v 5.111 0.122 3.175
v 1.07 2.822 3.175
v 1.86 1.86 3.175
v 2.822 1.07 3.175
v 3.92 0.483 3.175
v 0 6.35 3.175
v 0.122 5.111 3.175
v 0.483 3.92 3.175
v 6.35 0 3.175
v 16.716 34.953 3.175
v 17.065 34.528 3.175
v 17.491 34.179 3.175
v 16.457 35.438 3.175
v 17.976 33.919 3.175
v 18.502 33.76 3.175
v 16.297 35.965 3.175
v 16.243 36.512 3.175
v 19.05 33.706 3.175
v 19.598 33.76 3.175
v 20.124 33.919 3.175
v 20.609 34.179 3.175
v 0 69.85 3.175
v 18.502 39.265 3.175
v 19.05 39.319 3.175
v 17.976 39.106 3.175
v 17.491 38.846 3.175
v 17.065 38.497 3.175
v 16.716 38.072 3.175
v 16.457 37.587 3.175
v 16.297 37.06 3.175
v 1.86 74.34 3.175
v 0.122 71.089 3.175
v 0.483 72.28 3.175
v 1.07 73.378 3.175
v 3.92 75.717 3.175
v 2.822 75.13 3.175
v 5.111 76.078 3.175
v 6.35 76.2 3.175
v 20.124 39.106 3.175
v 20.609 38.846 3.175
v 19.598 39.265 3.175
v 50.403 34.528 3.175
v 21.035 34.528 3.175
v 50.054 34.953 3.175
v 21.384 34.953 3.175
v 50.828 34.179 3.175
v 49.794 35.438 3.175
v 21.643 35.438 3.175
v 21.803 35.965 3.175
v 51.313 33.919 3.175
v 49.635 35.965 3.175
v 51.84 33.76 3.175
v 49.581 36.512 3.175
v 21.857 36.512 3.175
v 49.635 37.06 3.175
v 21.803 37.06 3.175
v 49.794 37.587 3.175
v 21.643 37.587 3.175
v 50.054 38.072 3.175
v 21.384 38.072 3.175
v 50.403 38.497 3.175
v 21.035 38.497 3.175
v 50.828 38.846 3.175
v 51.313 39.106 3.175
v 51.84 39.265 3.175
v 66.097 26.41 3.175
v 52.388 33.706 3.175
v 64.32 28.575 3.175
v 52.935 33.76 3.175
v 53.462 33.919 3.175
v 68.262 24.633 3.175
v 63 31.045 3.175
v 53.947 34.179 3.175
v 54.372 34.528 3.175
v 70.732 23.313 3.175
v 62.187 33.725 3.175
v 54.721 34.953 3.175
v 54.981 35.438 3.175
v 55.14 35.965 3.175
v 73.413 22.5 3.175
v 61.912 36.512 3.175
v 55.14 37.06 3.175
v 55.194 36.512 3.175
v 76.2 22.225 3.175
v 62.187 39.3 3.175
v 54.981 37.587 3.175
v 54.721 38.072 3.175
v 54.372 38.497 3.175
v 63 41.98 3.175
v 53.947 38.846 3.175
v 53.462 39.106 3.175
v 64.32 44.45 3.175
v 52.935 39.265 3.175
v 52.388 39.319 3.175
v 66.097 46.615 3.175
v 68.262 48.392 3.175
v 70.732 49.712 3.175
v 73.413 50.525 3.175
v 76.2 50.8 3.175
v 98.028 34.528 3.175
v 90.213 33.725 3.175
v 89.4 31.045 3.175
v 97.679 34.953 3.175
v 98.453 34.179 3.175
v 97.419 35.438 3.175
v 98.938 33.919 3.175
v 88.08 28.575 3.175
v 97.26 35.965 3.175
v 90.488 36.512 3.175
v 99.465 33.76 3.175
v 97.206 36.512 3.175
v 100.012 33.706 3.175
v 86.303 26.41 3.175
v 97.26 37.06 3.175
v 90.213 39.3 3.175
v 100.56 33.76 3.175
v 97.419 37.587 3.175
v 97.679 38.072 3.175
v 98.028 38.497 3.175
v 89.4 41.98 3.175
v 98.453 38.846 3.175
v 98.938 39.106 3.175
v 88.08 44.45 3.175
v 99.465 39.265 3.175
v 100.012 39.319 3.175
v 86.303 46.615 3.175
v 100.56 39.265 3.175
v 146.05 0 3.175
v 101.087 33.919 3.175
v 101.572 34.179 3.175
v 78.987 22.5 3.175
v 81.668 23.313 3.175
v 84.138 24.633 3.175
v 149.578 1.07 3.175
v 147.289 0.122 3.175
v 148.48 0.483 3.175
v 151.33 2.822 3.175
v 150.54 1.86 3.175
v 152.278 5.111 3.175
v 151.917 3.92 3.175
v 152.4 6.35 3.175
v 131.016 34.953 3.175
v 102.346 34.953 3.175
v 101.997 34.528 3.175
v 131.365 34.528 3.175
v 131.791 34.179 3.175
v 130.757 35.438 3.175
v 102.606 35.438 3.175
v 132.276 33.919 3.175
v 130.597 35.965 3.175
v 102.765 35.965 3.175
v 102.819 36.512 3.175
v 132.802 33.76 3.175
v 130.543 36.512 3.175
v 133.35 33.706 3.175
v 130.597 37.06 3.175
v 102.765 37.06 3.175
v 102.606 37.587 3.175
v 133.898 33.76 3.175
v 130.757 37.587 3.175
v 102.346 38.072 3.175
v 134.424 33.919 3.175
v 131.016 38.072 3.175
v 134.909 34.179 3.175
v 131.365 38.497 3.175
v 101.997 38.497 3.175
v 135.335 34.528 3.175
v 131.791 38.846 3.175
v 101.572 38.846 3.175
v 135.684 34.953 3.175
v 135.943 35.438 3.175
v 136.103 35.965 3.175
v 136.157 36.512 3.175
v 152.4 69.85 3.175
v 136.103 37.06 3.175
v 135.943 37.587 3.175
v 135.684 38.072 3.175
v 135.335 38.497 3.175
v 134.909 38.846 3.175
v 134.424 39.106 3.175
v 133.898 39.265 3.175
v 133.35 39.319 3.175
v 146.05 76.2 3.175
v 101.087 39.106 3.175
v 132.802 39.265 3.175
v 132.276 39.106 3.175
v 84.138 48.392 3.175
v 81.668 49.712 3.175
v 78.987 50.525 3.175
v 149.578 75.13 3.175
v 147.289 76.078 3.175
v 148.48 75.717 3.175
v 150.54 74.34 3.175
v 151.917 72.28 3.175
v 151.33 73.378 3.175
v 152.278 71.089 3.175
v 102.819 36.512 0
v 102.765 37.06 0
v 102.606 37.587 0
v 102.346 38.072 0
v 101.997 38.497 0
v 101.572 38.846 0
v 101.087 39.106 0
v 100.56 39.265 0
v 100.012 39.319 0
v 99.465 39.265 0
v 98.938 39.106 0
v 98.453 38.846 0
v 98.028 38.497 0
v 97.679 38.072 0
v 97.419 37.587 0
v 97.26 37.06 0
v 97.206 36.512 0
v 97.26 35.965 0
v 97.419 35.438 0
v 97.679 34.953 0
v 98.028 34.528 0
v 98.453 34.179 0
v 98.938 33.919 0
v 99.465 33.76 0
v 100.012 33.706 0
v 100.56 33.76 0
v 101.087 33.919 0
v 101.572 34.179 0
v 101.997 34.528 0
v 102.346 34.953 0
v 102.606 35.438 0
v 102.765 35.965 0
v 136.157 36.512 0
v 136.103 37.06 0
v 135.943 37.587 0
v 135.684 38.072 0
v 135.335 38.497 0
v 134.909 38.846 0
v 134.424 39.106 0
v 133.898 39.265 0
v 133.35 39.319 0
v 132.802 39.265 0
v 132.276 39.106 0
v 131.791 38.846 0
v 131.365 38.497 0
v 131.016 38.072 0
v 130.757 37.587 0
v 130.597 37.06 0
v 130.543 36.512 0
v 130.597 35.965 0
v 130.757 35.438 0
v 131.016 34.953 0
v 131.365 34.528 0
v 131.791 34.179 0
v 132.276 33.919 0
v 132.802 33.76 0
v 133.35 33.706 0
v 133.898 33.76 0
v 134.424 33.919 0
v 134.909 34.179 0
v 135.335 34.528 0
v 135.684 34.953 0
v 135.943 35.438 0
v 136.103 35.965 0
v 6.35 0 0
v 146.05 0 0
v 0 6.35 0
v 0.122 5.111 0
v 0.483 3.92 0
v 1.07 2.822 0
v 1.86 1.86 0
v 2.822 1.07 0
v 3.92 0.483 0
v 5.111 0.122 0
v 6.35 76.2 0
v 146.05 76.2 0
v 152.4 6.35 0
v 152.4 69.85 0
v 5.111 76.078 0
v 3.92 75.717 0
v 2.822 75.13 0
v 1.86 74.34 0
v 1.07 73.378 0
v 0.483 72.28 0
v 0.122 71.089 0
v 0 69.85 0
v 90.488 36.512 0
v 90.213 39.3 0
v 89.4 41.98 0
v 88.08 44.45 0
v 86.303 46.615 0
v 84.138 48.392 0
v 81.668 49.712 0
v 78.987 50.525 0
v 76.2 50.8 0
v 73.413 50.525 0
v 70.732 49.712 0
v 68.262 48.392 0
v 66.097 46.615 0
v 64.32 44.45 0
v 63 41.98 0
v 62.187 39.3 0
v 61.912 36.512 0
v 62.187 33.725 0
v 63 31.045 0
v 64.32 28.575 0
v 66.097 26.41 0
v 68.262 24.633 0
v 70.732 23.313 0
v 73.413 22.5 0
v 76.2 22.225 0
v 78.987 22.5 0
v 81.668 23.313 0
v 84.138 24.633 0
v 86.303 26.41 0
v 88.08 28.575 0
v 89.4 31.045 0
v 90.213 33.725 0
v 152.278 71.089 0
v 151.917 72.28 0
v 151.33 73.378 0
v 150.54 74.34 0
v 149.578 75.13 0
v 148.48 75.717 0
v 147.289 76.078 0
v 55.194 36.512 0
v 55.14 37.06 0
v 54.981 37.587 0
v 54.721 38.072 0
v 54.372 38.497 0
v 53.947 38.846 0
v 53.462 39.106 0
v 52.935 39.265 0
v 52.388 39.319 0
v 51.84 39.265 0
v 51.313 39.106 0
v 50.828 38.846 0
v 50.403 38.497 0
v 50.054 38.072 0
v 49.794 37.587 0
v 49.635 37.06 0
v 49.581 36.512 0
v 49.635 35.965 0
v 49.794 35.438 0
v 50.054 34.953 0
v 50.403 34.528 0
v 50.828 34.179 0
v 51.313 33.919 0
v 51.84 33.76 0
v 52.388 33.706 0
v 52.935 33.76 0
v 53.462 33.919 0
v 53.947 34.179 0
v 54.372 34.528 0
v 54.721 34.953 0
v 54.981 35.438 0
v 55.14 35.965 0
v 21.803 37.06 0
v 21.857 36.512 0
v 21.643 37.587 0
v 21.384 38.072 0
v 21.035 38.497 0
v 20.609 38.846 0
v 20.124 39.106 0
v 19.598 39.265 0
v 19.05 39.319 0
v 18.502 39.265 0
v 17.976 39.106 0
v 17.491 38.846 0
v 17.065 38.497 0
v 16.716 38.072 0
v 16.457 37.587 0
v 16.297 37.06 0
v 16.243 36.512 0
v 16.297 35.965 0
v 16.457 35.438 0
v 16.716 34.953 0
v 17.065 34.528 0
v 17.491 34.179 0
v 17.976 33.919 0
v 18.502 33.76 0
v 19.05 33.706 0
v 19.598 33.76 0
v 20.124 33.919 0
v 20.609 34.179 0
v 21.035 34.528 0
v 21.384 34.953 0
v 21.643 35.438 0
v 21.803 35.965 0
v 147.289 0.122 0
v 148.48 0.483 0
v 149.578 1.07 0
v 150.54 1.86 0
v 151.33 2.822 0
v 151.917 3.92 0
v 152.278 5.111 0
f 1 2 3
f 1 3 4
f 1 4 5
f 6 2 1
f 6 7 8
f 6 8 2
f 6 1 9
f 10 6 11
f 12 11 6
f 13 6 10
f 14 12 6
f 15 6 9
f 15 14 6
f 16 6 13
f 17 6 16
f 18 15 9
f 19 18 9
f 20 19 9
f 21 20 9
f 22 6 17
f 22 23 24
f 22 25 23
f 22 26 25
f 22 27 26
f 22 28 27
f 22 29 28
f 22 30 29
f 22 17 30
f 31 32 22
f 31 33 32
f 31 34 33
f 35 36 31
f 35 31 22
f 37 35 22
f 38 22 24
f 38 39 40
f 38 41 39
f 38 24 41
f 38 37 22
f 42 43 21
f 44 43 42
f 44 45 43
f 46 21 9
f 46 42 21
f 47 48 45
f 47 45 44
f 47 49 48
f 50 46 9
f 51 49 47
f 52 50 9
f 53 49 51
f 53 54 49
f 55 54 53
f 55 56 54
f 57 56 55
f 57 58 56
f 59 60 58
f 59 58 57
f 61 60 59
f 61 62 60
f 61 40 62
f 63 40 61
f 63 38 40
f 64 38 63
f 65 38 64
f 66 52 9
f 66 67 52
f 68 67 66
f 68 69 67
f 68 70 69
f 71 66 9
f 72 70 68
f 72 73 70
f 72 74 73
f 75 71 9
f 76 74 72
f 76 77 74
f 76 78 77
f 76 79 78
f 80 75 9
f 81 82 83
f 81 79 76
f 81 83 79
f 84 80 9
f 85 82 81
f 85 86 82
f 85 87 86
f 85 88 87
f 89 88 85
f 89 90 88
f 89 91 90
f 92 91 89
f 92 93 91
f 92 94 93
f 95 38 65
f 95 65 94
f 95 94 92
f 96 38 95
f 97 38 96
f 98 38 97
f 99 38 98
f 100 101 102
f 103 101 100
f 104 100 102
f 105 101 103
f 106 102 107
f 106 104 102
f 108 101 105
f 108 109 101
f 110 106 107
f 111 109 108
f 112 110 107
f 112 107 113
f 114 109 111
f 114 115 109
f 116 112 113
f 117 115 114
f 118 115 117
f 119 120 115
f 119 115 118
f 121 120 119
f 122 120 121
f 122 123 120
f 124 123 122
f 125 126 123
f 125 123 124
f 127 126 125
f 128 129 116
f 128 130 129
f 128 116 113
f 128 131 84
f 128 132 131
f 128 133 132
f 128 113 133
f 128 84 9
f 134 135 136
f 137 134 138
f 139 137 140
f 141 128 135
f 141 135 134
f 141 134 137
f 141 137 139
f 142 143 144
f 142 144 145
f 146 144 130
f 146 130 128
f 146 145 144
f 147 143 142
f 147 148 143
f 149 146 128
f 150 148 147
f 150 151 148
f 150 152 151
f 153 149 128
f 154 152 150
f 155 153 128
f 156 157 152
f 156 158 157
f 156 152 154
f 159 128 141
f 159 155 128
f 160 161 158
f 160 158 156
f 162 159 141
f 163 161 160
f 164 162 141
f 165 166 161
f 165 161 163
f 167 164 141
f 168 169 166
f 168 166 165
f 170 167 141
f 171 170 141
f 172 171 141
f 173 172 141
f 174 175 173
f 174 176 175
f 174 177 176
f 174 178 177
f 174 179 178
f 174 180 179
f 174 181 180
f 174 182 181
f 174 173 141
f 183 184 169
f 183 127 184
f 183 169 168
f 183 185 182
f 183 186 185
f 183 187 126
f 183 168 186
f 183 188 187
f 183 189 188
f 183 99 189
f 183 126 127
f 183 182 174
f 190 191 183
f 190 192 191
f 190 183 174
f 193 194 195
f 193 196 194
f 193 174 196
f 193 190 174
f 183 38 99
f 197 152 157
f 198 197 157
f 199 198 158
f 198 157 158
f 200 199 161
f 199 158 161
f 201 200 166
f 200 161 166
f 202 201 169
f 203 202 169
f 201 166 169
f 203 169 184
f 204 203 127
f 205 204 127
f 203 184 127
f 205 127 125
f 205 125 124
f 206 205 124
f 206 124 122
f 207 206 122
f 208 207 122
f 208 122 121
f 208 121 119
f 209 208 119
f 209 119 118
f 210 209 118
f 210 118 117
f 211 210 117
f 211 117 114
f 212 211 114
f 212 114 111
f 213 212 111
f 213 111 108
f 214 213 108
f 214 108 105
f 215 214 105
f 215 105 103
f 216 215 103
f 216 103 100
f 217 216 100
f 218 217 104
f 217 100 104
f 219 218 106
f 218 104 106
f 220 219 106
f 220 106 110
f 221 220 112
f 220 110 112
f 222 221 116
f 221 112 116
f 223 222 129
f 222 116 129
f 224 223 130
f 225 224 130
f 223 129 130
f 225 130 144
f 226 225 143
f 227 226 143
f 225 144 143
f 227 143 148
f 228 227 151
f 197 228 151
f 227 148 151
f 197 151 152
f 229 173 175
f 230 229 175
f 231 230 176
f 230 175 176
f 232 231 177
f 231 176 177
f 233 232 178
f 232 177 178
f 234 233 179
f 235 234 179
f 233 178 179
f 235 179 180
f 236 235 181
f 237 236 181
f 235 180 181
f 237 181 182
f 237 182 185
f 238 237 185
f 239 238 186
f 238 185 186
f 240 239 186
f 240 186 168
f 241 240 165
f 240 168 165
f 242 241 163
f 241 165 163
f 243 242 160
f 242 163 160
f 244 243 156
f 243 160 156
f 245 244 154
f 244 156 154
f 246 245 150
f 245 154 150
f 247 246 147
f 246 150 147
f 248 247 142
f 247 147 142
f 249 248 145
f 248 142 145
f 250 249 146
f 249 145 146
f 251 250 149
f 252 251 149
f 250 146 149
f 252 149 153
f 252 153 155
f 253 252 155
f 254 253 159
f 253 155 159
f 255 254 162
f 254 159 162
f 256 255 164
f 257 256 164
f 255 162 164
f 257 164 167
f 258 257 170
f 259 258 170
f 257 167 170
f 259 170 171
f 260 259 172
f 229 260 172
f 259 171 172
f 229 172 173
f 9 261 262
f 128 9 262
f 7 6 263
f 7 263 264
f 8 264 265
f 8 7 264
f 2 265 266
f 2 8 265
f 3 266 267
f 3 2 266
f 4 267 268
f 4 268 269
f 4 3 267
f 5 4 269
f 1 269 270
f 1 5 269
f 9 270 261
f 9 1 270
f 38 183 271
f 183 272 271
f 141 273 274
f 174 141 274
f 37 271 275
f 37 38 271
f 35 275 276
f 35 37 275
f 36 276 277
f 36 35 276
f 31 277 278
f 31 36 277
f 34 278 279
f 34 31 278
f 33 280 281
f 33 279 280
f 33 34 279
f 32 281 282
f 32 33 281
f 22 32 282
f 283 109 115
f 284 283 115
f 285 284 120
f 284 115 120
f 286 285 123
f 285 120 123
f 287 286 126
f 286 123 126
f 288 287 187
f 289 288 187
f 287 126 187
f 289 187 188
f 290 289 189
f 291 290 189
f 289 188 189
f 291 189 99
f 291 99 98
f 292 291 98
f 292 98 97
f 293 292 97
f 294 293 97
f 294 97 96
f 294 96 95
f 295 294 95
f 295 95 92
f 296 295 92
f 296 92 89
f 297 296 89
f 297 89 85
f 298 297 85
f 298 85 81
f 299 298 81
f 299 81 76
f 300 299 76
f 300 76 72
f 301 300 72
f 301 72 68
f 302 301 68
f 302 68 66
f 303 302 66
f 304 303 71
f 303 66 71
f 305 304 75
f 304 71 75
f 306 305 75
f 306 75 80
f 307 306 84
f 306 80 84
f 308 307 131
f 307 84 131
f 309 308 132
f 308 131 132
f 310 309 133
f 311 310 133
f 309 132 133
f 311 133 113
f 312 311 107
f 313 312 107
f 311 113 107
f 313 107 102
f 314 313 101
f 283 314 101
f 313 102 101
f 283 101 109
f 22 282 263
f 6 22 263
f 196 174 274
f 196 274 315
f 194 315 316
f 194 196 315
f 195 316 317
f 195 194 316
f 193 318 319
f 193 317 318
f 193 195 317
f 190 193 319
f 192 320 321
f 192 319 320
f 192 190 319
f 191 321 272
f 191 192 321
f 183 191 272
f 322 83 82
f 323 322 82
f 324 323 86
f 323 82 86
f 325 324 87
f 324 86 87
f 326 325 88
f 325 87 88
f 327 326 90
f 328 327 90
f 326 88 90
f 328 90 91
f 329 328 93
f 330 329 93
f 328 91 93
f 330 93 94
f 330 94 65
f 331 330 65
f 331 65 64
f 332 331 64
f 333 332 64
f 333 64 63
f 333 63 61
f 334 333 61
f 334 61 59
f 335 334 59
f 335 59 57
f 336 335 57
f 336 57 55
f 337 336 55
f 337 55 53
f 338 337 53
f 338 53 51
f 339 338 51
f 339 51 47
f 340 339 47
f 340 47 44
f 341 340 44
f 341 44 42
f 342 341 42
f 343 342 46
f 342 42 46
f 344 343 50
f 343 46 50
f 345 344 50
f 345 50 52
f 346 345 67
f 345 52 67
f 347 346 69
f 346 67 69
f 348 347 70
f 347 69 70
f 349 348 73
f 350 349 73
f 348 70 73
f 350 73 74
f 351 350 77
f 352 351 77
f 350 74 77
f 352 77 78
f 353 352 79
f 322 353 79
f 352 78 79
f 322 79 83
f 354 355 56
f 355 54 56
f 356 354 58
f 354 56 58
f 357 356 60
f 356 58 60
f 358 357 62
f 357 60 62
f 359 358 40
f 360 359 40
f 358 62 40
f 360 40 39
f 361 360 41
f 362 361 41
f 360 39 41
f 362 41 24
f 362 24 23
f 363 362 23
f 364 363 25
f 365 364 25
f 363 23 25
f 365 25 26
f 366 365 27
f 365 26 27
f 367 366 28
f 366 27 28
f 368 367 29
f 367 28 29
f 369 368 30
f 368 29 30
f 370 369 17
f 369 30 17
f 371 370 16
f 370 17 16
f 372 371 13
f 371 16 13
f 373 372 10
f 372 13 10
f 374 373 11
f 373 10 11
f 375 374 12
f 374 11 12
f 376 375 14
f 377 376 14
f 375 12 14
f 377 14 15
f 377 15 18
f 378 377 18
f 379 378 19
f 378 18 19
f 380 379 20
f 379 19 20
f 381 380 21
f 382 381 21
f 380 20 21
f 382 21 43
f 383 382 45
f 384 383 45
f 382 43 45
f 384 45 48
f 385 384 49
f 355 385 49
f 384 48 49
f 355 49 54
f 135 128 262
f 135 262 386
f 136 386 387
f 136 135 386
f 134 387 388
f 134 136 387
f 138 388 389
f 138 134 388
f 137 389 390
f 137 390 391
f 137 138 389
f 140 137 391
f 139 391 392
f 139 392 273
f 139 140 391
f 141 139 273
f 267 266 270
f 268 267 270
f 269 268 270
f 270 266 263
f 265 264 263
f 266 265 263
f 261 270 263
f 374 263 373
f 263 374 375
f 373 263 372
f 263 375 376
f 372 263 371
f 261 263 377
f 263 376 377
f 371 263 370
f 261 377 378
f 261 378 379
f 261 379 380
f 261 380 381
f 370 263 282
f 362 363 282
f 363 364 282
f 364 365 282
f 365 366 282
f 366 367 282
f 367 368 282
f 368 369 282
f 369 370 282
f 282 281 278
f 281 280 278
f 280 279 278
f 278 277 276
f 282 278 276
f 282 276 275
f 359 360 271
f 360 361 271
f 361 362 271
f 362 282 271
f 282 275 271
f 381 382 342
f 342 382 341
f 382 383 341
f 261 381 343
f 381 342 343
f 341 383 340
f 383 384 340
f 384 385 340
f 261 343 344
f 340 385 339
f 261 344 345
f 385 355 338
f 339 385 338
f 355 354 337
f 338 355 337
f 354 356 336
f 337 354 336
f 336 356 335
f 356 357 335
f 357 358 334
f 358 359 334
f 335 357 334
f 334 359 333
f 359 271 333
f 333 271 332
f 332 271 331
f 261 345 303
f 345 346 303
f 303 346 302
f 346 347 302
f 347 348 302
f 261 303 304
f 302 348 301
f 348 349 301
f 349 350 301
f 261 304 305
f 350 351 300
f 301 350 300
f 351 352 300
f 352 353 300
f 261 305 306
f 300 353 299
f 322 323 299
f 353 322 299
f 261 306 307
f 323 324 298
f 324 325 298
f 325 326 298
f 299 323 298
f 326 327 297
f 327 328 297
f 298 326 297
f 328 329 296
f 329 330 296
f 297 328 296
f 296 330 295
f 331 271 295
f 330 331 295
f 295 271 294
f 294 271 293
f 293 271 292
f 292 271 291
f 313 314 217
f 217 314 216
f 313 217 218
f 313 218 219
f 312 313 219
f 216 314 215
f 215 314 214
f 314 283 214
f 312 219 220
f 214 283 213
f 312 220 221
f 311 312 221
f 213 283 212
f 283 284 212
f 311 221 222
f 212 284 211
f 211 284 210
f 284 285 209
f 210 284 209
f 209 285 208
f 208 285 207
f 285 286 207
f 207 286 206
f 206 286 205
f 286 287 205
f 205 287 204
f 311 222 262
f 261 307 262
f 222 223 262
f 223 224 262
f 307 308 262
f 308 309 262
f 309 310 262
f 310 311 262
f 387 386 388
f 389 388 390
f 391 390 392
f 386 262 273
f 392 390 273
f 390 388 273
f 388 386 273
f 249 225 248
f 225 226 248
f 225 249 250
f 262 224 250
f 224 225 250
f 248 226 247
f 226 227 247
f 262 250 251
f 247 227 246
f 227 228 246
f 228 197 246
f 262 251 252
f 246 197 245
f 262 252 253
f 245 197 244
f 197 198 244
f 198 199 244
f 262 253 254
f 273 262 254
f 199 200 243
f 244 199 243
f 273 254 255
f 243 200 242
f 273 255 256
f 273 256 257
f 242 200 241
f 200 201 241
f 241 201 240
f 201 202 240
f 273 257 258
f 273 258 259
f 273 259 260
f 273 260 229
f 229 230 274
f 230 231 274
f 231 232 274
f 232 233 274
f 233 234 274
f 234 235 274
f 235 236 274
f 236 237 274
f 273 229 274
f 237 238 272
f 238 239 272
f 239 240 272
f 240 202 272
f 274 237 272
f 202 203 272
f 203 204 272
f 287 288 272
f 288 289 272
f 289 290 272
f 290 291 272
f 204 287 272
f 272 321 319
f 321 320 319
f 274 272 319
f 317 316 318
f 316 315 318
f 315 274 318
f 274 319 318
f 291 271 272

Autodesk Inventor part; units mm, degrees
ref_plane "YZ Plane" through (0, 0, 0) normal (1, 0, 0) x (0, 1, 0)
ref_plane "XZ Plane" through (0, 0, 0) normal (0, 1, 0) x (-1, 0, 0)
ref_plane "XY Plane" through (0, 0, 0) normal (0, 0, 1) x (1, 0, 0)
sketch "Sketch1" plane through (0, 0, 0) normal (0, 0, 1) x (1, 0, 0)
  line L0 (0, 0) -> (152.4, 0)
  line L1 (152.4, 0) -> (152.4, 76.2)
  line L2 (152.4, 76.2) -> (0, 76.2)
  line L3 (0, 76.2) -> (0, 0)
  dimension "d0" = 152.4
  dimension "d1" = 76.2
extrude "Extrusion1" add sketch "Sketch1" along normal blind 3.175
sketch "Sketch2" plane through (0, 0, 3.175) normal (0, 0, 1) x (1, 0, 0)
  line L0 (152.4, 76.2) -> (0, 76.2) projected
  line L1 (0, 76.2) -> (0, 0) projected
  circle A0 centre (52.3875, 36.5125) radius 2.8067
  circle A1 centre (100.0125, 36.5125) radius 2.8067
  circle A2 centre (19.05, 36.5125) radius 2.8067
  circle A3 centre (133.35, 36.5125) radius 2.8067
  circle A4 centre (76.2, 36.5125) radius 14.2875
  line L2 (0, 0) -> (152.4, 0) projected
  dimension "d8" = 5.6134
  dimension "d9" = 5.6134
  dimension "d11" = 5.6134
  dimension "d12" = 5.6134
  dimension "d22" = 28.575
  dimension "d23" = 76.2
  dimension "d24" = 36.5125
  dimension "d25" = 36.5125
  dimension "d26" = 36.5125
  dimension "d27" = 36.5125
  dimension "d28" = 36.5125
extrude "Extrusion3" cut sketch "Sketch2" against normal blind 25.4
fillet "Fillet2" radius 6.35 4 edges at (152.4, 0, 1.5875) (152.4, 76.2, 1.5875) (0, 76.2, 1.5875) (0, 0, 1.5875)
properties part number "GearboxPlate" material "Aluminum 6061"
